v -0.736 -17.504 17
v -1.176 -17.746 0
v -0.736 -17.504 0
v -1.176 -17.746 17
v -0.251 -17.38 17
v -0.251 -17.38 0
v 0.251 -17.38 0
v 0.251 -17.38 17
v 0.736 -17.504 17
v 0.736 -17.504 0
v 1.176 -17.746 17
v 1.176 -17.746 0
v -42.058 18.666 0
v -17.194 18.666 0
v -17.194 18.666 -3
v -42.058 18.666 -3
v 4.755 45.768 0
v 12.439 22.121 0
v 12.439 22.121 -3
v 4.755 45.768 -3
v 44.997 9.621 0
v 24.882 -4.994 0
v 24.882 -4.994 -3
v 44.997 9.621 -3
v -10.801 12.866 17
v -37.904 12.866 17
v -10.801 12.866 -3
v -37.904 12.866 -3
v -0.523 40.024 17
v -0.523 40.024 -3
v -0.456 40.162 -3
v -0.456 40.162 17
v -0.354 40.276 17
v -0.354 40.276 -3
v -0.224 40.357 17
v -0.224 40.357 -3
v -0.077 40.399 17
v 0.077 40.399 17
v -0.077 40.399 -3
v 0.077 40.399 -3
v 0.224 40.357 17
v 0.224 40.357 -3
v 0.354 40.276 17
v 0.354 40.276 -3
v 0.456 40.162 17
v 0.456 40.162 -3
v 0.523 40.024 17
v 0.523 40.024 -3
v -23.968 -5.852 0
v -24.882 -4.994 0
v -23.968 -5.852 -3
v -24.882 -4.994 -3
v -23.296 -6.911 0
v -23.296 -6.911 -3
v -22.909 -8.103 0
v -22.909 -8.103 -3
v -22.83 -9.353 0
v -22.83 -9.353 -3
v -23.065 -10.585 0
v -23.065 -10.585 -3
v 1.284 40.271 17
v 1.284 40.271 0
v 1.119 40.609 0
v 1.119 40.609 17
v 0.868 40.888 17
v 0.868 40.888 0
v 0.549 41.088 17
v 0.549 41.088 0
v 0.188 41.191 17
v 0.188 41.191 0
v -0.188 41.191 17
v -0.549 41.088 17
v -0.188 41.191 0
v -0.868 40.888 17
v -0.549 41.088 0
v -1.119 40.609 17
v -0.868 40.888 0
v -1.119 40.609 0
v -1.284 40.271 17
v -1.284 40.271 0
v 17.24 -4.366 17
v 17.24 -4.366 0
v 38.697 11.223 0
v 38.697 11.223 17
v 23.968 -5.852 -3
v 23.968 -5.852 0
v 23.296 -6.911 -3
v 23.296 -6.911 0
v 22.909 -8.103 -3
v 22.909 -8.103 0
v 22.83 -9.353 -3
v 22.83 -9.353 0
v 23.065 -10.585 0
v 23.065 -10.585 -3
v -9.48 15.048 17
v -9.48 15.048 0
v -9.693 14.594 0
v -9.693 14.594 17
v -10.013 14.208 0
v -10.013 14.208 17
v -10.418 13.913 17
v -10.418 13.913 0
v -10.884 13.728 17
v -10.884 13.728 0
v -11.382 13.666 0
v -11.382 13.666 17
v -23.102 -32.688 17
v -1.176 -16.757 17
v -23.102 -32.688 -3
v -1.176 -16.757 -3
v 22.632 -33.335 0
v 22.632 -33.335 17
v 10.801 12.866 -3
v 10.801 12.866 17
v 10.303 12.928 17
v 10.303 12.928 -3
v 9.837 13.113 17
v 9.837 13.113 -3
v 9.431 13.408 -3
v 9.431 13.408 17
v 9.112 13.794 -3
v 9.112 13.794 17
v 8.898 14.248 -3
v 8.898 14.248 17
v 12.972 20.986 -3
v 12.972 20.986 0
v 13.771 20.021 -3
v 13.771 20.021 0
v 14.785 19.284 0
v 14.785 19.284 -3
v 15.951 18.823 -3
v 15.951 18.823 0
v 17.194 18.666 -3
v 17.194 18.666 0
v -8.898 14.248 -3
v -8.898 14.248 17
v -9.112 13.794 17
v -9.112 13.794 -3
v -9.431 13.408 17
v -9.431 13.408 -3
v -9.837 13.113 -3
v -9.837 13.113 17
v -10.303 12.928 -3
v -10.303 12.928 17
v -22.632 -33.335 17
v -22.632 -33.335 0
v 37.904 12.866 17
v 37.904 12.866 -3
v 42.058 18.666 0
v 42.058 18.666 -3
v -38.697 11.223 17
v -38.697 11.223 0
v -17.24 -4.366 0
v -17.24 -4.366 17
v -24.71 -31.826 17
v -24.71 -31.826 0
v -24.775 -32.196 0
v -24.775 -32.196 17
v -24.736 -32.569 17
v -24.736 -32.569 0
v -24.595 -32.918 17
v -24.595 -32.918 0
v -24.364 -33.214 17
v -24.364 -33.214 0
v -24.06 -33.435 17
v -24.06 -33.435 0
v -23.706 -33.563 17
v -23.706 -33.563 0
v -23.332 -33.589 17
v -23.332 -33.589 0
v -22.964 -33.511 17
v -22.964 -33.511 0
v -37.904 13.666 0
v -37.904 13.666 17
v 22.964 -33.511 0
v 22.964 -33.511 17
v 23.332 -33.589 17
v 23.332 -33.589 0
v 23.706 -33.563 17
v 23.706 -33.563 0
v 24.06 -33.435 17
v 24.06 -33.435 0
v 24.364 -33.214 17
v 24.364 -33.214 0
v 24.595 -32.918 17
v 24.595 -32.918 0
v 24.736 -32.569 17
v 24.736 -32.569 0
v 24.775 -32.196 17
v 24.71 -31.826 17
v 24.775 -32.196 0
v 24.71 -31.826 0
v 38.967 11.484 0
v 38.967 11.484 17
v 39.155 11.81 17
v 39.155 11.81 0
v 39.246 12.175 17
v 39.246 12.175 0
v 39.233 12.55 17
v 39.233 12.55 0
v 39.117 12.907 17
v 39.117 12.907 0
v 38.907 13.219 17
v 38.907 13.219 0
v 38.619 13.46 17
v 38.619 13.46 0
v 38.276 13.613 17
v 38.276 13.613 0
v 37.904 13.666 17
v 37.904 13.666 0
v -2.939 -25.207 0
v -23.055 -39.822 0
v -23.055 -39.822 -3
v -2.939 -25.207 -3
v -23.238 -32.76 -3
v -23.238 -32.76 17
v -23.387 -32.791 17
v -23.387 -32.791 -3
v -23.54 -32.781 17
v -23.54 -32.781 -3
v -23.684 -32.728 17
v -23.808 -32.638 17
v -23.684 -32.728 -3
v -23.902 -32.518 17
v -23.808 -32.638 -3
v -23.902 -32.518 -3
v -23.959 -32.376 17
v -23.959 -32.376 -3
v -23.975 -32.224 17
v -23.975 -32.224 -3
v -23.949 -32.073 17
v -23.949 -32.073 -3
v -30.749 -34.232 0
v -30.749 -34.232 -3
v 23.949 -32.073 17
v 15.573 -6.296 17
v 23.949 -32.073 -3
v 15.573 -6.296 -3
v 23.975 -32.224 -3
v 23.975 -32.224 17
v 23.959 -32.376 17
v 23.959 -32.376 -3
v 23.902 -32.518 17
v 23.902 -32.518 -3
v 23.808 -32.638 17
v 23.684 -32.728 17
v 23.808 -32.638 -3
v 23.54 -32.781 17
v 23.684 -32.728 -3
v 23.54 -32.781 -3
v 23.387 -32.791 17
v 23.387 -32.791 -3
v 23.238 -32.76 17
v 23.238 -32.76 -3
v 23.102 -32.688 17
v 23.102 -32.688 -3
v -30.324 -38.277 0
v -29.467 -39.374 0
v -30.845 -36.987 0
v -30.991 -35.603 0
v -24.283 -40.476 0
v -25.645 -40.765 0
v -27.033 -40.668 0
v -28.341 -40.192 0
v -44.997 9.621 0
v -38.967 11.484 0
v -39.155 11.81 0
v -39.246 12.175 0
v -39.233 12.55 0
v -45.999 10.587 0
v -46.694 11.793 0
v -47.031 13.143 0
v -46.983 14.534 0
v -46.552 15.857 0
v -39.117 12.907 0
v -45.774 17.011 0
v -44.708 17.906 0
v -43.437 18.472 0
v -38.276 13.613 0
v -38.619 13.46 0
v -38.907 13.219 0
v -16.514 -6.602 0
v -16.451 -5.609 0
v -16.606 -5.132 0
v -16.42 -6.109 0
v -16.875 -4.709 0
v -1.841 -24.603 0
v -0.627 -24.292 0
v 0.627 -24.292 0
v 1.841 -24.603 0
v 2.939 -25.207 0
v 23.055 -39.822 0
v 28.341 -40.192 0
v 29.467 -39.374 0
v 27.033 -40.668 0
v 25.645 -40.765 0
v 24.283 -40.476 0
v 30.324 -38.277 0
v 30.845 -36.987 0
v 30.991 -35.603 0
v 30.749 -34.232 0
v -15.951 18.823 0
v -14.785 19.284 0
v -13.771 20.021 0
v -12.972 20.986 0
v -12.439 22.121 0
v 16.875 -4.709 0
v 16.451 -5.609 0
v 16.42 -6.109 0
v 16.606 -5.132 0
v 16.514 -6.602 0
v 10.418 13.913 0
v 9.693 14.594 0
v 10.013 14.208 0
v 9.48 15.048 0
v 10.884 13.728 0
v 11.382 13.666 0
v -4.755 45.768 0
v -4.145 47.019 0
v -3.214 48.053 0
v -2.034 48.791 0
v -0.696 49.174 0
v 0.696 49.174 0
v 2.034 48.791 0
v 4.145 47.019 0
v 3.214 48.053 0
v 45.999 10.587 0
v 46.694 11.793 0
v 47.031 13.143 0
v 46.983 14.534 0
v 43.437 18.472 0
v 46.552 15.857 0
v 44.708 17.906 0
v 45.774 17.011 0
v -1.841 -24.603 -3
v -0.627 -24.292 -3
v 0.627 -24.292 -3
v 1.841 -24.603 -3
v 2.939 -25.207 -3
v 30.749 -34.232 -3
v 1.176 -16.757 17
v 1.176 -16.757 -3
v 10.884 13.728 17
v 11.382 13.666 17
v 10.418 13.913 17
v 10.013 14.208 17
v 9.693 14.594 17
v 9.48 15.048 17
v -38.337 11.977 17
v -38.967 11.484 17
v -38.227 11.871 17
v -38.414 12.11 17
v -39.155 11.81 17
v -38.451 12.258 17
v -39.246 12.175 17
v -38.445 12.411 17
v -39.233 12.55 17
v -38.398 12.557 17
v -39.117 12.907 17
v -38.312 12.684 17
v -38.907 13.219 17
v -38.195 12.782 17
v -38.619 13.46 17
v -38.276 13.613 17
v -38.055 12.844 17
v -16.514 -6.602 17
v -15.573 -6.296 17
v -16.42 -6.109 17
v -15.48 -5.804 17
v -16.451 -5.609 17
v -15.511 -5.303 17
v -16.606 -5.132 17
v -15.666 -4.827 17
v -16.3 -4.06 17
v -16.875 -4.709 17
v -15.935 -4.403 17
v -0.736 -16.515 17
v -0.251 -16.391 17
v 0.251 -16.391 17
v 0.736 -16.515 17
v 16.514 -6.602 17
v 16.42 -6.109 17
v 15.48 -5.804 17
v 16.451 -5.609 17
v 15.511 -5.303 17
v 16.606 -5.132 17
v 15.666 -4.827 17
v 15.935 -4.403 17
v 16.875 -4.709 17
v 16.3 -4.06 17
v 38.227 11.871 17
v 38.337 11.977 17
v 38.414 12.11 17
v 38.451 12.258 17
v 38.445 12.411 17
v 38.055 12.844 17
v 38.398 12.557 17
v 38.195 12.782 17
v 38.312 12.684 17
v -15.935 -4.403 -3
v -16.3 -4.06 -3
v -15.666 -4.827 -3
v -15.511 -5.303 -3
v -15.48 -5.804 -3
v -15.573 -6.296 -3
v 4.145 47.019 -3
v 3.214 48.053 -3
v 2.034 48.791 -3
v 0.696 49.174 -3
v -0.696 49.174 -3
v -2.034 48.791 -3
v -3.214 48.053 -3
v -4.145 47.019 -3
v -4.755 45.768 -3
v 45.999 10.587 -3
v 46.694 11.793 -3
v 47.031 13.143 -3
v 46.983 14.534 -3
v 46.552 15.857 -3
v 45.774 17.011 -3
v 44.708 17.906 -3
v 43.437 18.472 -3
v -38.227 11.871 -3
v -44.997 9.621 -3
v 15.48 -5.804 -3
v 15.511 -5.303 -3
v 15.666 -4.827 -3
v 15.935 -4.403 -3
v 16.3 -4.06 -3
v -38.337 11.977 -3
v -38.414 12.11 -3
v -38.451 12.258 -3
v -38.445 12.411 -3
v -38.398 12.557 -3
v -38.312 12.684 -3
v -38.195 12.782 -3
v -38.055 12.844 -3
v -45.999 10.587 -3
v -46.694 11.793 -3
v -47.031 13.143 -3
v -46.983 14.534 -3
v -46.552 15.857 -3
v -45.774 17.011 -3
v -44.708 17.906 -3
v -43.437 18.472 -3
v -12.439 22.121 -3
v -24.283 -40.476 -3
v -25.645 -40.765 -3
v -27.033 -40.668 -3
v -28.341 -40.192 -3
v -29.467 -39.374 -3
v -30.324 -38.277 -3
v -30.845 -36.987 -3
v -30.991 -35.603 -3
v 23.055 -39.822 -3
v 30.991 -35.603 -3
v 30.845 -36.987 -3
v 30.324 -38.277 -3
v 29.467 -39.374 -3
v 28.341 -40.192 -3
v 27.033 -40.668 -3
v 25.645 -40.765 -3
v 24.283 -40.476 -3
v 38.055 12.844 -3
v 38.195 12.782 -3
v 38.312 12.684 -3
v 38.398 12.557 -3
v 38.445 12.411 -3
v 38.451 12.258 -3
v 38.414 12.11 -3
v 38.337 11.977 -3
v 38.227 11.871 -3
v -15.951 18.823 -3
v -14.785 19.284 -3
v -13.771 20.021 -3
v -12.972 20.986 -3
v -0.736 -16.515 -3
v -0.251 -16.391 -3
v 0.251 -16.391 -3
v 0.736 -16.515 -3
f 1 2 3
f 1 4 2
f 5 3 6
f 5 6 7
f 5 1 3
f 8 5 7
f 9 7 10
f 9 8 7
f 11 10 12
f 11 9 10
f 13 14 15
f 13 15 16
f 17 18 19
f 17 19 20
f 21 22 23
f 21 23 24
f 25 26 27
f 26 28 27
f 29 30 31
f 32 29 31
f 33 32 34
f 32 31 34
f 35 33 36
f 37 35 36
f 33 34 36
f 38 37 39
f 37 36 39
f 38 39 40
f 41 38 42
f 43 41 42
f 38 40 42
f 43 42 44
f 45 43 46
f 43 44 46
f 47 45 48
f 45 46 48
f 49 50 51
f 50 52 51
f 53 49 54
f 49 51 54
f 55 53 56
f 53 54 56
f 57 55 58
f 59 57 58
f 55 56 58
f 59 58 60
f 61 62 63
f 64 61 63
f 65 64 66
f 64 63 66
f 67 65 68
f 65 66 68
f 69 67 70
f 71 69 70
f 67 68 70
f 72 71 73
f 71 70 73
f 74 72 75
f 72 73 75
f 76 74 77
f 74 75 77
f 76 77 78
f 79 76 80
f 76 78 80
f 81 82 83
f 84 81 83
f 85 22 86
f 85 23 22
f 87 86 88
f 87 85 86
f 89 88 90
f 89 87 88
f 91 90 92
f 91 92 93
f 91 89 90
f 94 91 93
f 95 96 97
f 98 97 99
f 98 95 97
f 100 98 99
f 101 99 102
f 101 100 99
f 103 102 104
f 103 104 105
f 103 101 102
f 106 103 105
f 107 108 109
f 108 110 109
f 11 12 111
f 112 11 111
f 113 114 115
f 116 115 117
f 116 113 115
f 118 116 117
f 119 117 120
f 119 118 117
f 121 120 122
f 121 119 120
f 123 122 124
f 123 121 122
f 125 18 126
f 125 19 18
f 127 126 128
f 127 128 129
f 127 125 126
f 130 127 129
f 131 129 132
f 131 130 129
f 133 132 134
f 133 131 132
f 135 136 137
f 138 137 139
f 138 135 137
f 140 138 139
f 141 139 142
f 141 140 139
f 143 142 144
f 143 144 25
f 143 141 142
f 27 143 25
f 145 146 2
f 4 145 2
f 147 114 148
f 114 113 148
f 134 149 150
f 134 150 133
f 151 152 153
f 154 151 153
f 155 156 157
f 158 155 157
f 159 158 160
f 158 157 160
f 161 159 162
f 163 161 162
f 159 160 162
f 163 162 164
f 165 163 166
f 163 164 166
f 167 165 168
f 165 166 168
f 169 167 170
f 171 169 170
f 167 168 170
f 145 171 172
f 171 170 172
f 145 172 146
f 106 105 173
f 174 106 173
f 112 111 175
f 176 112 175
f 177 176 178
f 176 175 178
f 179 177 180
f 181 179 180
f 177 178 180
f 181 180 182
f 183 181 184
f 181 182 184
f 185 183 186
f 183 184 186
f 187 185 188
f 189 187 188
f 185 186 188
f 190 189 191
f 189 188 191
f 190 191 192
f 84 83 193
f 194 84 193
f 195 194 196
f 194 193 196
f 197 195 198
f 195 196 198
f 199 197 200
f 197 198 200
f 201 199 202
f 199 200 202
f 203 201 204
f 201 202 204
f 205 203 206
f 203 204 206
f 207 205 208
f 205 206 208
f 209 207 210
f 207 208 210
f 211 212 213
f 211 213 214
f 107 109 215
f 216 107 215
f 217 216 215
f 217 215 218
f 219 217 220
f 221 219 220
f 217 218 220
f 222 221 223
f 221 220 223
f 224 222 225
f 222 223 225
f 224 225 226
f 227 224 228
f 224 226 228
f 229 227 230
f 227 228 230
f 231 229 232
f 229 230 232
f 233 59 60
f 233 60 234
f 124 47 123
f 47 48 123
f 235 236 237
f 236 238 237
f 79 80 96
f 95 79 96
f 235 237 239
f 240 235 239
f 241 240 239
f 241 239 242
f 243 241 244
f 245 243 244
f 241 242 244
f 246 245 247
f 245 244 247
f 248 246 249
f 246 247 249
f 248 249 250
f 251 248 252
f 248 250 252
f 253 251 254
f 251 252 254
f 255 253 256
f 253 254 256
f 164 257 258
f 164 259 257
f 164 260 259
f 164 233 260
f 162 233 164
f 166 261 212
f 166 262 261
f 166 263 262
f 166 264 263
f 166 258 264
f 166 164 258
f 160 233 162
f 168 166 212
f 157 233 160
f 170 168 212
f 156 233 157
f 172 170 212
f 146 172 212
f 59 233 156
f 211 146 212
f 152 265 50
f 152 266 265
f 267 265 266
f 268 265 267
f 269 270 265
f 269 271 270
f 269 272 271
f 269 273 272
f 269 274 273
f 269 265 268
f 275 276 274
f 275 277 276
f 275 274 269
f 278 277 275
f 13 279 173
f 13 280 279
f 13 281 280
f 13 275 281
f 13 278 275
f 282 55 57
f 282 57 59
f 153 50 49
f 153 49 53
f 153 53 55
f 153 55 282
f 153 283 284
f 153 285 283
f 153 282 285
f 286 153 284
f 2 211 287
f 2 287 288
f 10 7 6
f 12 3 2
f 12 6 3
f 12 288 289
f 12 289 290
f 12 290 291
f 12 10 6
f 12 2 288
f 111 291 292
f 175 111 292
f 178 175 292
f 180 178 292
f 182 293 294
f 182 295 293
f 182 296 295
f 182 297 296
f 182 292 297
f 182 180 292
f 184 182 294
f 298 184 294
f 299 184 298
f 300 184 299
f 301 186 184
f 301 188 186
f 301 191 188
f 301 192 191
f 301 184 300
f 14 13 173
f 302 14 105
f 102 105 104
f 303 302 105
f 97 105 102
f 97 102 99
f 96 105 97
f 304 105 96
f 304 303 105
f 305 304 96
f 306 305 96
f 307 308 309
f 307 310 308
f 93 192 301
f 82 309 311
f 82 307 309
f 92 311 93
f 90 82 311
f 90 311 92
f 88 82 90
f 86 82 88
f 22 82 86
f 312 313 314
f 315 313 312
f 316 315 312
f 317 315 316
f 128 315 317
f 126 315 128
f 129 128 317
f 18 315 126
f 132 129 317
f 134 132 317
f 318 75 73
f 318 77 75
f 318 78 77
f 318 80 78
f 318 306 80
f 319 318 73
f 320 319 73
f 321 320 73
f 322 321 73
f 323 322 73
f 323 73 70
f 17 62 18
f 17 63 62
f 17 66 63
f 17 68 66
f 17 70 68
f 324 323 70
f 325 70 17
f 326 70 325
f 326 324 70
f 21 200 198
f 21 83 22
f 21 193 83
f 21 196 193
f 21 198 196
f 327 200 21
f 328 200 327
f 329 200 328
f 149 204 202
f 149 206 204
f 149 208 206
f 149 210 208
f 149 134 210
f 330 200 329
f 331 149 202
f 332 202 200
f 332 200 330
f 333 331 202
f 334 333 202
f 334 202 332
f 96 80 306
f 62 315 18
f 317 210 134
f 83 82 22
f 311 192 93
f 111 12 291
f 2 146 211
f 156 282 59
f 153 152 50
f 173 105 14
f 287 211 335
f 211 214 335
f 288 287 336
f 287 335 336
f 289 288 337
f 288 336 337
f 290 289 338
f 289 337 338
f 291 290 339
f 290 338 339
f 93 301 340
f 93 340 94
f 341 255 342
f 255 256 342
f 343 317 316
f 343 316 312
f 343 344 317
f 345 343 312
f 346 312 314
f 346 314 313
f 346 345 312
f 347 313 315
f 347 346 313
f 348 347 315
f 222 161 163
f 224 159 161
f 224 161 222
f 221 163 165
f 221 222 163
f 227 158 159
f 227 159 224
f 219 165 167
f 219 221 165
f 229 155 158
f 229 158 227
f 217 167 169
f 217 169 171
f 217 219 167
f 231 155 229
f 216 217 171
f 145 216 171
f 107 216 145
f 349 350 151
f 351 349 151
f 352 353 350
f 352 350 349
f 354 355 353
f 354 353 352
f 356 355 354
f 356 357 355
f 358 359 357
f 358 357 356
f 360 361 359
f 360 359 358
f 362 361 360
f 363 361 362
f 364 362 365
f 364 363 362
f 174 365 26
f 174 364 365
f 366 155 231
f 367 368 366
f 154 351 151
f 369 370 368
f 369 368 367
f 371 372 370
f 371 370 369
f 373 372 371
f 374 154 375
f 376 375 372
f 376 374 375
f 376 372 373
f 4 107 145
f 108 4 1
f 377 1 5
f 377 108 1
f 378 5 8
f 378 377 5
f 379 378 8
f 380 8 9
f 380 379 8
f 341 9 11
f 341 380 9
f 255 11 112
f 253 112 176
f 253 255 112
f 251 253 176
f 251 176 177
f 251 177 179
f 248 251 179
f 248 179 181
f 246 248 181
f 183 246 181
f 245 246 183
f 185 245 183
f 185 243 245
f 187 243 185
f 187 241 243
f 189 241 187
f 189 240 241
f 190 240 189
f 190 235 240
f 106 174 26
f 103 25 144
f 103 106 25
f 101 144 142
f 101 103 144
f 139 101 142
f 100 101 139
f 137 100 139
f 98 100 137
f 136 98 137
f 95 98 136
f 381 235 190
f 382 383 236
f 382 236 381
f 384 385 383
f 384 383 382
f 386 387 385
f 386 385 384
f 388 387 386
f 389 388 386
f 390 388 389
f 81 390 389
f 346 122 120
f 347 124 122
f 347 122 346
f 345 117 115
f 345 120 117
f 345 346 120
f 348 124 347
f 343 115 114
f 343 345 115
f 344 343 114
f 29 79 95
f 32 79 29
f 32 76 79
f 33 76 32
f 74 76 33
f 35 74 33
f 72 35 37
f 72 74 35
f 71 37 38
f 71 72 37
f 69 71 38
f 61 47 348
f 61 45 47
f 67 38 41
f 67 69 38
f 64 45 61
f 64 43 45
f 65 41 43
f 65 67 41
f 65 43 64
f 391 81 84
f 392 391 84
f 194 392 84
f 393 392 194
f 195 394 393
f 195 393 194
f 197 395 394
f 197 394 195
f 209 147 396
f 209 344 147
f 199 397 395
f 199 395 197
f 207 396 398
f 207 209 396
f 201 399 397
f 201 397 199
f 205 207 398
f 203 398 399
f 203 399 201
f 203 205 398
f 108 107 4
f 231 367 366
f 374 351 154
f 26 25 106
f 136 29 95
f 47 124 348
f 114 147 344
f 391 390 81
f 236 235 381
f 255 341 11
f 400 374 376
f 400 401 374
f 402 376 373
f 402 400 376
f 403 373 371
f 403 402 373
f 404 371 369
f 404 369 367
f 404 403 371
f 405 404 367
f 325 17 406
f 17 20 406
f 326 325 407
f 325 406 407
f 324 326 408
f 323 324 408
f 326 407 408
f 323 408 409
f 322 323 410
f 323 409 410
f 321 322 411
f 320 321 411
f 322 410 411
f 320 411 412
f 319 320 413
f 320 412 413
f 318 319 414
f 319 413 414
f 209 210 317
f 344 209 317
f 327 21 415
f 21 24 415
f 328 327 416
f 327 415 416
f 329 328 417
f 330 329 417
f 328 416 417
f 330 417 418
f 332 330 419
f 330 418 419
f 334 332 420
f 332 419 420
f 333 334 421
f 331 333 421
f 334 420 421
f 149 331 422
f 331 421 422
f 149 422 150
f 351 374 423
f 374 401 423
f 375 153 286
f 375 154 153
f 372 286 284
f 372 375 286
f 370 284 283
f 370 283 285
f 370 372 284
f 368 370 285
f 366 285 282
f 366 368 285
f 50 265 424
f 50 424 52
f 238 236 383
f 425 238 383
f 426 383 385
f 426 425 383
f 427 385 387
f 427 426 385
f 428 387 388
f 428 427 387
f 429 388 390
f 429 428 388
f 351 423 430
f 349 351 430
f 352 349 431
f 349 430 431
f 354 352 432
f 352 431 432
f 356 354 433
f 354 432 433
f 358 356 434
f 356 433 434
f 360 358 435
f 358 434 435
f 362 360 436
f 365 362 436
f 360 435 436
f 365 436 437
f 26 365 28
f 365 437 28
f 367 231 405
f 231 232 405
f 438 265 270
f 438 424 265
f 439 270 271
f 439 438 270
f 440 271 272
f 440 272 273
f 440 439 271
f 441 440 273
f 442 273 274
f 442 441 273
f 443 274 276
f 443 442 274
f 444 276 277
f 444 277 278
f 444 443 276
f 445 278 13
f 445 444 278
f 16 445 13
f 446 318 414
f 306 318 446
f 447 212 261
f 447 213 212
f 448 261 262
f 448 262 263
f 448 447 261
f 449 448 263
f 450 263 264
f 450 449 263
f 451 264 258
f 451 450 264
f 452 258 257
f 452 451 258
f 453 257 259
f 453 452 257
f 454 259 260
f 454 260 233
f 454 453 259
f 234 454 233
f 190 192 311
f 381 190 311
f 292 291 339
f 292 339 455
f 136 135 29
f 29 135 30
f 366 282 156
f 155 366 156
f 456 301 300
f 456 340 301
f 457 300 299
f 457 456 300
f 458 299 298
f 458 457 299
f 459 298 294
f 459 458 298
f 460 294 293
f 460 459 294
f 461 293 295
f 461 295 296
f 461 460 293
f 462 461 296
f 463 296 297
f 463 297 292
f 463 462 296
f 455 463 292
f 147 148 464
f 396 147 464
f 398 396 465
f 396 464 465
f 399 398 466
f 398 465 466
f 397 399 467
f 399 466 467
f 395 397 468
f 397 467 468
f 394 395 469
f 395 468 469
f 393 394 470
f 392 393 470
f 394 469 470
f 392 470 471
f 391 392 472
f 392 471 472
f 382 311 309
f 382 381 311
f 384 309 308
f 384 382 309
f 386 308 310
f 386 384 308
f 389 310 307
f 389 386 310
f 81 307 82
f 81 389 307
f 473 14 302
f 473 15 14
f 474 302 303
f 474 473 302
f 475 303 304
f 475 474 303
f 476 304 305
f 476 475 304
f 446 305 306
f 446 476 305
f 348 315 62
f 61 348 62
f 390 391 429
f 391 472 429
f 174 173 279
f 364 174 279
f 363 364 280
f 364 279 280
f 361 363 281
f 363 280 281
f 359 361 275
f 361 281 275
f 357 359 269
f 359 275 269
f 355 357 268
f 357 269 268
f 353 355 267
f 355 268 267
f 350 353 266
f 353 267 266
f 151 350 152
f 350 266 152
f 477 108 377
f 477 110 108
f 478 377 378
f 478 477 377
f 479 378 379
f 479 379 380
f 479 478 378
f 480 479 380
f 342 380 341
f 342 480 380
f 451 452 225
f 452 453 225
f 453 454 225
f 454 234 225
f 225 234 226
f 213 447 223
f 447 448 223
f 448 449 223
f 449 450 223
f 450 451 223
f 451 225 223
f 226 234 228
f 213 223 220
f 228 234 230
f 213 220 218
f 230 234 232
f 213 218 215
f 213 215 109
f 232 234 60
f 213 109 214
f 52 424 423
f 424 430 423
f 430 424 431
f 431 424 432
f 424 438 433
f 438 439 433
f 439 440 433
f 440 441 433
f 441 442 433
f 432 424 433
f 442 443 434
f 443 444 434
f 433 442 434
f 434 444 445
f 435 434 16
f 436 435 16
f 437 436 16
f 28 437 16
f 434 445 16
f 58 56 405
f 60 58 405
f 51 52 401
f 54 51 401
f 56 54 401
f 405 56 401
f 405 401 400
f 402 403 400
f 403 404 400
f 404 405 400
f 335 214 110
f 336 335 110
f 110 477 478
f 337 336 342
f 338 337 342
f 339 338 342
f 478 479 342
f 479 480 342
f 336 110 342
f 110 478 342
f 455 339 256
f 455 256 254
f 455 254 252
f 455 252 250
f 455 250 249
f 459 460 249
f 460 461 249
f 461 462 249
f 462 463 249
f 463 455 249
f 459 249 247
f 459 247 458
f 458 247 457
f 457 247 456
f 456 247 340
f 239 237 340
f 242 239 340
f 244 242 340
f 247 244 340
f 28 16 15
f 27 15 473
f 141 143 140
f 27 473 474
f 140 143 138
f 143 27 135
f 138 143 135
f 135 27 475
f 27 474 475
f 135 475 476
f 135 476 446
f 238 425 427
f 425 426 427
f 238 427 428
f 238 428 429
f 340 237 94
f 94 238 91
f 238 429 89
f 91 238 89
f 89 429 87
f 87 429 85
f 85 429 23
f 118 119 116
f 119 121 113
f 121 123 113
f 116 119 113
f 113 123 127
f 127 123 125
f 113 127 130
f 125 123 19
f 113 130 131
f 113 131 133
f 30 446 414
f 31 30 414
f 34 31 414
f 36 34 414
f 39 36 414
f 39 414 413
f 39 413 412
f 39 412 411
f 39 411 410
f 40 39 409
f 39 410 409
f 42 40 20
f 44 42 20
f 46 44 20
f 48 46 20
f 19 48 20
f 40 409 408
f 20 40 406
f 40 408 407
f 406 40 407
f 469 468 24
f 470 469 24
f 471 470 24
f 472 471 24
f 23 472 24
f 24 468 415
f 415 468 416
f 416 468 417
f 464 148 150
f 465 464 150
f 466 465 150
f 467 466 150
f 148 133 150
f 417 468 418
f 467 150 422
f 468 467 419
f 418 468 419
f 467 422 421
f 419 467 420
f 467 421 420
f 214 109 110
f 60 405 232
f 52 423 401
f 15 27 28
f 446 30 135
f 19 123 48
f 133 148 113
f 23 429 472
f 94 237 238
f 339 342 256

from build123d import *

# Parameters (mm, degrees)
F1_DEPTH = 3
F2_DEPTH = 17
F3_R     = 5
F4_R     = 5
F5_R     = 2


with BuildPart() as f1:
    # F0 (on Top) → F1 (new body)
    with BuildSketch(Plane.XY):
        Polygon((-13.561376, 18.665632), (-57.446909, 18.665632), (-21.942767, -7.129637), (-35.504142, -48.867259), (0, -23.07199), (35.504142, -48.867259), (21.942767, -7.129637), (57.446909, 18.665632), (13.561376, 18.665632), (0, 60.403254), align=None)
        with BuildLine():
            Line((-37.903616, 13.665631), (-9.928662, 13.665631))
            Line((-9.928662, 13.665631), (-1.283926, 40.271394))
            ThreePointArc((-1.283926, 40.271394), (0, 41.204221), (1.283926, 40.271394))
            Line((1.283926, 40.271394), (9.928662, 13.665631))
            Line((9.928662, 13.665631), (37.903616, 13.665631))
            ThreePointArc((37.903616, 13.665631), (39.187542, 12.732804), (38.697126, 11.223459))
            Line((38.697126, 11.223459), (16.064913, -5.219807))
            Line((16.064913, -5.219807), (24.709649, -31.825569))
            ThreePointArc((24.709649, -31.825569), (24.219233, -33.334915), (22.632213, -33.334915))
            Line((22.632213, -33.334915), (0, -16.891649))
            Line((0, -16.891649), (-22.632213, -33.334915))
            ThreePointArc((-22.632213, -33.334915), (-24.219233, -33.334915), (-24.709649, -31.825569))
            Line((-24.709649, -31.825569), (-16.064913, -5.219807))
            Line((-16.064913, -5.219807), (-38.697126, 11.223459))
            ThreePointArc((-38.697126, 11.223459), (-39.187542, 12.732804), (-37.903616, 13.665631))
        make_face(mode=Mode.SUBTRACT)
        with BuildLine():
            Line((-1.283926, 40.271394), (-9.928662, 13.665631))
            Line((-9.928662, 13.665631), (-37.903616, 13.665631))
            ThreePointArc((-37.903616, 13.665631), (-39.187542, 12.732804), (-38.697126, 11.223459))
            Line((-38.697126, 11.223459), (-16.064913, -5.219807))
            Line((-16.064913, -5.219807), (-24.709649, -31.825569))
            ThreePointArc((-24.709649, -31.825569), (-24.219233, -33.334915), (-22.632213, -33.334915))
            Line((-22.632213, -33.334915), (0, -16.891649))
            Line((0, -16.891649), (22.632213, -33.334915))
            ThreePointArc((22.632213, -33.334915), (24.219233, -33.334915), (24.709649, -31.825569))
            Line((24.709649, -31.825569), (16.064913, -5.219807))
            Line((16.064913, -5.219807), (38.697126, 11.223459))
            ThreePointArc((38.697126, 11.223459), (39.187542, 12.732804), (37.903616, 13.665631))
            Line((37.903616, 13.665631), (9.928662, 13.665631))
            Line((9.928662, 13.665631), (1.283926, 40.271394))
            ThreePointArc((1.283926, 40.271394), (0, 41.204221), (-1.283926, 40.271394))
        make_face()
        with BuildLine():
            Line((-23.948804, -32.072782), (-15.124457, -4.914234))
            Line((-15.124457, -4.914234), (-38.226898, 11.870672))
            ThreePointArc((-38.226898, 11.870672), (-38.426697, 12.485591), (-37.903616, 12.865631))
            Line((-37.903616, 12.865631), (-9.347428, 12.865631))
            Line((-9.347428, 12.865631), (-0.523081, 40.02418))
            ThreePointArc((-0.523081, 40.02418), (0, 40.404221), (0.523081, 40.02418))
            Line((0.523081, 40.02418), (9.347428, 12.865631))
            Line((9.347428, 12.865631), (37.903616, 12.865631))
            ThreePointArc((37.903616, 12.865631), (38.426697, 12.485591), (38.226898, 11.870672))
            Line((38.226898, 11.870672), (15.124457, -4.914234))
            Line((15.124457, -4.914234), (23.948804, -32.072782))
            ThreePointArc((23.948804, -32.072782), (23.749005, -32.687701), (23.102441, -32.687701))
            Line((23.102441, -32.687701), (0, -15.902795))
            Line((0, -15.902795), (-23.102441, -32.687701))
            ThreePointArc((-23.102441, -32.687701), (-23.749005, -32.687701), (-23.948804, -32.072782))
        make_face(mode=Mode.SUBTRACT)
    extrude(amount=-F1_DEPTH)

    # F0 (on Top) → F2 (join)
    with BuildSketch(Plane.XY):
        with BuildLine():
            Line((-1.283926, 40.271394), (-9.928662, 13.665631))
            Line((-9.928662, 13.665631), (-37.903616, 13.665631))
            ThreePointArc((-37.903616, 13.665631), (-39.187542, 12.732804), (-38.697126, 11.223459))
            Line((-38.697126, 11.223459), (-16.064913, -5.219807))
            Line((-16.064913, -5.219807), (-24.709649, -31.825569))
            ThreePointArc((-24.709649, -31.825569), (-24.219233, -33.334915), (-22.632213, -33.334915))
            Line((-22.632213, -33.334915), (0, -16.891649))
            Line((0, -16.891649), (22.632213, -33.334915))
            ThreePointArc((22.632213, -33.334915), (24.219233, -33.334915), (24.709649, -31.825569))
            Line((24.709649, -31.825569), (16.064913, -5.219807))
            Line((16.064913, -5.219807), (38.697126, 11.223459))
            ThreePointArc((38.697126, 11.223459), (39.187542, 12.732804), (37.903616, 13.665631))
            Line((37.903616, 13.665631), (9.928662, 13.665631))
            Line((9.928662, 13.665631), (1.283926, 40.271394))
            ThreePointArc((1.283926, 40.271394), (0, 41.204221), (-1.283926, 40.271394))
        make_face()
        with BuildLine():
            Line((-23.948804, -32.072782), (-15.124457, -4.914234))
            Line((-15.124457, -4.914234), (-38.226898, 11.870672))
            ThreePointArc((-38.226898, 11.870672), (-38.426697, 12.485591), (-37.903616, 12.865631))
            Line((-37.903616, 12.865631), (-9.347428, 12.865631))
            Line((-9.347428, 12.865631), (-0.523081, 40.02418))
            ThreePointArc((-0.523081, 40.02418), (0, 40.404221), (0.523081, 40.02418))
            Line((0.523081, 40.02418), (9.347428, 12.865631))
            Line((9.347428, 12.865631), (37.903616, 12.865631))
            ThreePointArc((37.903616, 12.865631), (38.426697, 12.485591), (38.226898, 11.870672))
            Line((38.226898, 11.870672), (15.124457, -4.914234))
            Line((15.124457, -4.914234), (23.948804, -32.072782))
            ThreePointArc((23.948804, -32.072782), (23.749005, -32.687701), (23.102441, -32.687701))
            Line((23.102441, -32.687701), (0, -15.902795))
            Line((0, -15.902795), (-23.102441, -32.687701))
            ThreePointArc((-23.102441, -32.687701), (-23.749005, -32.687701), (-23.948804, -32.072782))
        make_face(mode=Mode.SUBTRACT)
    extrude(amount=F2_DEPTH)

    # F3
    f3_edges = [f1.edges().sort_by_distance(p)[0] for p in [
        (-35.504142, -48.867259, -1.5),
        (-57.446909, 18.665632, -1.5),
        (35.504142, -48.867259, -1.5),
        (0, 60.403254, -1.5),
        (57.446909, 18.665632, -1.5),
    ]]
    fillet(f3_edges, radius=F3_R)

    # F4
    f4_edges = [f1.edges().sort_by_distance(p)[0] for p in [
        (-21.942767, -7.129637, -1.5),
        (-13.561376, 18.665632, -1.5),
        (13.561376, 18.665632, -1.5),
        (21.942767, -7.129637, -1.5),
        (0, -23.07199, -1.5),
    ]]
    fillet(f4_edges, radius=F4_R)

    # F5
    f5_edges = [f1.edges().sort_by_distance(p)[0] for p in [
        (-9.347428, 12.865631, 7),
        (-9.928662, 13.665631, 8.5),
        (9.928662, 13.665631, 8.5),
        (9.347428, 12.865631, 7),
        (16.064913, -5.219807, 8.5),
        (15.124457, -4.914234, 7),
        (-15.124457, -4.914234, 7),
        (-16.064913, -5.219807, 8.5),
        (0, -15.902795, 7),
        (0, -16.891649, 8.5),
    ]]
    fillet(f5_edges, radius=F5_R)


solid = f1.part
